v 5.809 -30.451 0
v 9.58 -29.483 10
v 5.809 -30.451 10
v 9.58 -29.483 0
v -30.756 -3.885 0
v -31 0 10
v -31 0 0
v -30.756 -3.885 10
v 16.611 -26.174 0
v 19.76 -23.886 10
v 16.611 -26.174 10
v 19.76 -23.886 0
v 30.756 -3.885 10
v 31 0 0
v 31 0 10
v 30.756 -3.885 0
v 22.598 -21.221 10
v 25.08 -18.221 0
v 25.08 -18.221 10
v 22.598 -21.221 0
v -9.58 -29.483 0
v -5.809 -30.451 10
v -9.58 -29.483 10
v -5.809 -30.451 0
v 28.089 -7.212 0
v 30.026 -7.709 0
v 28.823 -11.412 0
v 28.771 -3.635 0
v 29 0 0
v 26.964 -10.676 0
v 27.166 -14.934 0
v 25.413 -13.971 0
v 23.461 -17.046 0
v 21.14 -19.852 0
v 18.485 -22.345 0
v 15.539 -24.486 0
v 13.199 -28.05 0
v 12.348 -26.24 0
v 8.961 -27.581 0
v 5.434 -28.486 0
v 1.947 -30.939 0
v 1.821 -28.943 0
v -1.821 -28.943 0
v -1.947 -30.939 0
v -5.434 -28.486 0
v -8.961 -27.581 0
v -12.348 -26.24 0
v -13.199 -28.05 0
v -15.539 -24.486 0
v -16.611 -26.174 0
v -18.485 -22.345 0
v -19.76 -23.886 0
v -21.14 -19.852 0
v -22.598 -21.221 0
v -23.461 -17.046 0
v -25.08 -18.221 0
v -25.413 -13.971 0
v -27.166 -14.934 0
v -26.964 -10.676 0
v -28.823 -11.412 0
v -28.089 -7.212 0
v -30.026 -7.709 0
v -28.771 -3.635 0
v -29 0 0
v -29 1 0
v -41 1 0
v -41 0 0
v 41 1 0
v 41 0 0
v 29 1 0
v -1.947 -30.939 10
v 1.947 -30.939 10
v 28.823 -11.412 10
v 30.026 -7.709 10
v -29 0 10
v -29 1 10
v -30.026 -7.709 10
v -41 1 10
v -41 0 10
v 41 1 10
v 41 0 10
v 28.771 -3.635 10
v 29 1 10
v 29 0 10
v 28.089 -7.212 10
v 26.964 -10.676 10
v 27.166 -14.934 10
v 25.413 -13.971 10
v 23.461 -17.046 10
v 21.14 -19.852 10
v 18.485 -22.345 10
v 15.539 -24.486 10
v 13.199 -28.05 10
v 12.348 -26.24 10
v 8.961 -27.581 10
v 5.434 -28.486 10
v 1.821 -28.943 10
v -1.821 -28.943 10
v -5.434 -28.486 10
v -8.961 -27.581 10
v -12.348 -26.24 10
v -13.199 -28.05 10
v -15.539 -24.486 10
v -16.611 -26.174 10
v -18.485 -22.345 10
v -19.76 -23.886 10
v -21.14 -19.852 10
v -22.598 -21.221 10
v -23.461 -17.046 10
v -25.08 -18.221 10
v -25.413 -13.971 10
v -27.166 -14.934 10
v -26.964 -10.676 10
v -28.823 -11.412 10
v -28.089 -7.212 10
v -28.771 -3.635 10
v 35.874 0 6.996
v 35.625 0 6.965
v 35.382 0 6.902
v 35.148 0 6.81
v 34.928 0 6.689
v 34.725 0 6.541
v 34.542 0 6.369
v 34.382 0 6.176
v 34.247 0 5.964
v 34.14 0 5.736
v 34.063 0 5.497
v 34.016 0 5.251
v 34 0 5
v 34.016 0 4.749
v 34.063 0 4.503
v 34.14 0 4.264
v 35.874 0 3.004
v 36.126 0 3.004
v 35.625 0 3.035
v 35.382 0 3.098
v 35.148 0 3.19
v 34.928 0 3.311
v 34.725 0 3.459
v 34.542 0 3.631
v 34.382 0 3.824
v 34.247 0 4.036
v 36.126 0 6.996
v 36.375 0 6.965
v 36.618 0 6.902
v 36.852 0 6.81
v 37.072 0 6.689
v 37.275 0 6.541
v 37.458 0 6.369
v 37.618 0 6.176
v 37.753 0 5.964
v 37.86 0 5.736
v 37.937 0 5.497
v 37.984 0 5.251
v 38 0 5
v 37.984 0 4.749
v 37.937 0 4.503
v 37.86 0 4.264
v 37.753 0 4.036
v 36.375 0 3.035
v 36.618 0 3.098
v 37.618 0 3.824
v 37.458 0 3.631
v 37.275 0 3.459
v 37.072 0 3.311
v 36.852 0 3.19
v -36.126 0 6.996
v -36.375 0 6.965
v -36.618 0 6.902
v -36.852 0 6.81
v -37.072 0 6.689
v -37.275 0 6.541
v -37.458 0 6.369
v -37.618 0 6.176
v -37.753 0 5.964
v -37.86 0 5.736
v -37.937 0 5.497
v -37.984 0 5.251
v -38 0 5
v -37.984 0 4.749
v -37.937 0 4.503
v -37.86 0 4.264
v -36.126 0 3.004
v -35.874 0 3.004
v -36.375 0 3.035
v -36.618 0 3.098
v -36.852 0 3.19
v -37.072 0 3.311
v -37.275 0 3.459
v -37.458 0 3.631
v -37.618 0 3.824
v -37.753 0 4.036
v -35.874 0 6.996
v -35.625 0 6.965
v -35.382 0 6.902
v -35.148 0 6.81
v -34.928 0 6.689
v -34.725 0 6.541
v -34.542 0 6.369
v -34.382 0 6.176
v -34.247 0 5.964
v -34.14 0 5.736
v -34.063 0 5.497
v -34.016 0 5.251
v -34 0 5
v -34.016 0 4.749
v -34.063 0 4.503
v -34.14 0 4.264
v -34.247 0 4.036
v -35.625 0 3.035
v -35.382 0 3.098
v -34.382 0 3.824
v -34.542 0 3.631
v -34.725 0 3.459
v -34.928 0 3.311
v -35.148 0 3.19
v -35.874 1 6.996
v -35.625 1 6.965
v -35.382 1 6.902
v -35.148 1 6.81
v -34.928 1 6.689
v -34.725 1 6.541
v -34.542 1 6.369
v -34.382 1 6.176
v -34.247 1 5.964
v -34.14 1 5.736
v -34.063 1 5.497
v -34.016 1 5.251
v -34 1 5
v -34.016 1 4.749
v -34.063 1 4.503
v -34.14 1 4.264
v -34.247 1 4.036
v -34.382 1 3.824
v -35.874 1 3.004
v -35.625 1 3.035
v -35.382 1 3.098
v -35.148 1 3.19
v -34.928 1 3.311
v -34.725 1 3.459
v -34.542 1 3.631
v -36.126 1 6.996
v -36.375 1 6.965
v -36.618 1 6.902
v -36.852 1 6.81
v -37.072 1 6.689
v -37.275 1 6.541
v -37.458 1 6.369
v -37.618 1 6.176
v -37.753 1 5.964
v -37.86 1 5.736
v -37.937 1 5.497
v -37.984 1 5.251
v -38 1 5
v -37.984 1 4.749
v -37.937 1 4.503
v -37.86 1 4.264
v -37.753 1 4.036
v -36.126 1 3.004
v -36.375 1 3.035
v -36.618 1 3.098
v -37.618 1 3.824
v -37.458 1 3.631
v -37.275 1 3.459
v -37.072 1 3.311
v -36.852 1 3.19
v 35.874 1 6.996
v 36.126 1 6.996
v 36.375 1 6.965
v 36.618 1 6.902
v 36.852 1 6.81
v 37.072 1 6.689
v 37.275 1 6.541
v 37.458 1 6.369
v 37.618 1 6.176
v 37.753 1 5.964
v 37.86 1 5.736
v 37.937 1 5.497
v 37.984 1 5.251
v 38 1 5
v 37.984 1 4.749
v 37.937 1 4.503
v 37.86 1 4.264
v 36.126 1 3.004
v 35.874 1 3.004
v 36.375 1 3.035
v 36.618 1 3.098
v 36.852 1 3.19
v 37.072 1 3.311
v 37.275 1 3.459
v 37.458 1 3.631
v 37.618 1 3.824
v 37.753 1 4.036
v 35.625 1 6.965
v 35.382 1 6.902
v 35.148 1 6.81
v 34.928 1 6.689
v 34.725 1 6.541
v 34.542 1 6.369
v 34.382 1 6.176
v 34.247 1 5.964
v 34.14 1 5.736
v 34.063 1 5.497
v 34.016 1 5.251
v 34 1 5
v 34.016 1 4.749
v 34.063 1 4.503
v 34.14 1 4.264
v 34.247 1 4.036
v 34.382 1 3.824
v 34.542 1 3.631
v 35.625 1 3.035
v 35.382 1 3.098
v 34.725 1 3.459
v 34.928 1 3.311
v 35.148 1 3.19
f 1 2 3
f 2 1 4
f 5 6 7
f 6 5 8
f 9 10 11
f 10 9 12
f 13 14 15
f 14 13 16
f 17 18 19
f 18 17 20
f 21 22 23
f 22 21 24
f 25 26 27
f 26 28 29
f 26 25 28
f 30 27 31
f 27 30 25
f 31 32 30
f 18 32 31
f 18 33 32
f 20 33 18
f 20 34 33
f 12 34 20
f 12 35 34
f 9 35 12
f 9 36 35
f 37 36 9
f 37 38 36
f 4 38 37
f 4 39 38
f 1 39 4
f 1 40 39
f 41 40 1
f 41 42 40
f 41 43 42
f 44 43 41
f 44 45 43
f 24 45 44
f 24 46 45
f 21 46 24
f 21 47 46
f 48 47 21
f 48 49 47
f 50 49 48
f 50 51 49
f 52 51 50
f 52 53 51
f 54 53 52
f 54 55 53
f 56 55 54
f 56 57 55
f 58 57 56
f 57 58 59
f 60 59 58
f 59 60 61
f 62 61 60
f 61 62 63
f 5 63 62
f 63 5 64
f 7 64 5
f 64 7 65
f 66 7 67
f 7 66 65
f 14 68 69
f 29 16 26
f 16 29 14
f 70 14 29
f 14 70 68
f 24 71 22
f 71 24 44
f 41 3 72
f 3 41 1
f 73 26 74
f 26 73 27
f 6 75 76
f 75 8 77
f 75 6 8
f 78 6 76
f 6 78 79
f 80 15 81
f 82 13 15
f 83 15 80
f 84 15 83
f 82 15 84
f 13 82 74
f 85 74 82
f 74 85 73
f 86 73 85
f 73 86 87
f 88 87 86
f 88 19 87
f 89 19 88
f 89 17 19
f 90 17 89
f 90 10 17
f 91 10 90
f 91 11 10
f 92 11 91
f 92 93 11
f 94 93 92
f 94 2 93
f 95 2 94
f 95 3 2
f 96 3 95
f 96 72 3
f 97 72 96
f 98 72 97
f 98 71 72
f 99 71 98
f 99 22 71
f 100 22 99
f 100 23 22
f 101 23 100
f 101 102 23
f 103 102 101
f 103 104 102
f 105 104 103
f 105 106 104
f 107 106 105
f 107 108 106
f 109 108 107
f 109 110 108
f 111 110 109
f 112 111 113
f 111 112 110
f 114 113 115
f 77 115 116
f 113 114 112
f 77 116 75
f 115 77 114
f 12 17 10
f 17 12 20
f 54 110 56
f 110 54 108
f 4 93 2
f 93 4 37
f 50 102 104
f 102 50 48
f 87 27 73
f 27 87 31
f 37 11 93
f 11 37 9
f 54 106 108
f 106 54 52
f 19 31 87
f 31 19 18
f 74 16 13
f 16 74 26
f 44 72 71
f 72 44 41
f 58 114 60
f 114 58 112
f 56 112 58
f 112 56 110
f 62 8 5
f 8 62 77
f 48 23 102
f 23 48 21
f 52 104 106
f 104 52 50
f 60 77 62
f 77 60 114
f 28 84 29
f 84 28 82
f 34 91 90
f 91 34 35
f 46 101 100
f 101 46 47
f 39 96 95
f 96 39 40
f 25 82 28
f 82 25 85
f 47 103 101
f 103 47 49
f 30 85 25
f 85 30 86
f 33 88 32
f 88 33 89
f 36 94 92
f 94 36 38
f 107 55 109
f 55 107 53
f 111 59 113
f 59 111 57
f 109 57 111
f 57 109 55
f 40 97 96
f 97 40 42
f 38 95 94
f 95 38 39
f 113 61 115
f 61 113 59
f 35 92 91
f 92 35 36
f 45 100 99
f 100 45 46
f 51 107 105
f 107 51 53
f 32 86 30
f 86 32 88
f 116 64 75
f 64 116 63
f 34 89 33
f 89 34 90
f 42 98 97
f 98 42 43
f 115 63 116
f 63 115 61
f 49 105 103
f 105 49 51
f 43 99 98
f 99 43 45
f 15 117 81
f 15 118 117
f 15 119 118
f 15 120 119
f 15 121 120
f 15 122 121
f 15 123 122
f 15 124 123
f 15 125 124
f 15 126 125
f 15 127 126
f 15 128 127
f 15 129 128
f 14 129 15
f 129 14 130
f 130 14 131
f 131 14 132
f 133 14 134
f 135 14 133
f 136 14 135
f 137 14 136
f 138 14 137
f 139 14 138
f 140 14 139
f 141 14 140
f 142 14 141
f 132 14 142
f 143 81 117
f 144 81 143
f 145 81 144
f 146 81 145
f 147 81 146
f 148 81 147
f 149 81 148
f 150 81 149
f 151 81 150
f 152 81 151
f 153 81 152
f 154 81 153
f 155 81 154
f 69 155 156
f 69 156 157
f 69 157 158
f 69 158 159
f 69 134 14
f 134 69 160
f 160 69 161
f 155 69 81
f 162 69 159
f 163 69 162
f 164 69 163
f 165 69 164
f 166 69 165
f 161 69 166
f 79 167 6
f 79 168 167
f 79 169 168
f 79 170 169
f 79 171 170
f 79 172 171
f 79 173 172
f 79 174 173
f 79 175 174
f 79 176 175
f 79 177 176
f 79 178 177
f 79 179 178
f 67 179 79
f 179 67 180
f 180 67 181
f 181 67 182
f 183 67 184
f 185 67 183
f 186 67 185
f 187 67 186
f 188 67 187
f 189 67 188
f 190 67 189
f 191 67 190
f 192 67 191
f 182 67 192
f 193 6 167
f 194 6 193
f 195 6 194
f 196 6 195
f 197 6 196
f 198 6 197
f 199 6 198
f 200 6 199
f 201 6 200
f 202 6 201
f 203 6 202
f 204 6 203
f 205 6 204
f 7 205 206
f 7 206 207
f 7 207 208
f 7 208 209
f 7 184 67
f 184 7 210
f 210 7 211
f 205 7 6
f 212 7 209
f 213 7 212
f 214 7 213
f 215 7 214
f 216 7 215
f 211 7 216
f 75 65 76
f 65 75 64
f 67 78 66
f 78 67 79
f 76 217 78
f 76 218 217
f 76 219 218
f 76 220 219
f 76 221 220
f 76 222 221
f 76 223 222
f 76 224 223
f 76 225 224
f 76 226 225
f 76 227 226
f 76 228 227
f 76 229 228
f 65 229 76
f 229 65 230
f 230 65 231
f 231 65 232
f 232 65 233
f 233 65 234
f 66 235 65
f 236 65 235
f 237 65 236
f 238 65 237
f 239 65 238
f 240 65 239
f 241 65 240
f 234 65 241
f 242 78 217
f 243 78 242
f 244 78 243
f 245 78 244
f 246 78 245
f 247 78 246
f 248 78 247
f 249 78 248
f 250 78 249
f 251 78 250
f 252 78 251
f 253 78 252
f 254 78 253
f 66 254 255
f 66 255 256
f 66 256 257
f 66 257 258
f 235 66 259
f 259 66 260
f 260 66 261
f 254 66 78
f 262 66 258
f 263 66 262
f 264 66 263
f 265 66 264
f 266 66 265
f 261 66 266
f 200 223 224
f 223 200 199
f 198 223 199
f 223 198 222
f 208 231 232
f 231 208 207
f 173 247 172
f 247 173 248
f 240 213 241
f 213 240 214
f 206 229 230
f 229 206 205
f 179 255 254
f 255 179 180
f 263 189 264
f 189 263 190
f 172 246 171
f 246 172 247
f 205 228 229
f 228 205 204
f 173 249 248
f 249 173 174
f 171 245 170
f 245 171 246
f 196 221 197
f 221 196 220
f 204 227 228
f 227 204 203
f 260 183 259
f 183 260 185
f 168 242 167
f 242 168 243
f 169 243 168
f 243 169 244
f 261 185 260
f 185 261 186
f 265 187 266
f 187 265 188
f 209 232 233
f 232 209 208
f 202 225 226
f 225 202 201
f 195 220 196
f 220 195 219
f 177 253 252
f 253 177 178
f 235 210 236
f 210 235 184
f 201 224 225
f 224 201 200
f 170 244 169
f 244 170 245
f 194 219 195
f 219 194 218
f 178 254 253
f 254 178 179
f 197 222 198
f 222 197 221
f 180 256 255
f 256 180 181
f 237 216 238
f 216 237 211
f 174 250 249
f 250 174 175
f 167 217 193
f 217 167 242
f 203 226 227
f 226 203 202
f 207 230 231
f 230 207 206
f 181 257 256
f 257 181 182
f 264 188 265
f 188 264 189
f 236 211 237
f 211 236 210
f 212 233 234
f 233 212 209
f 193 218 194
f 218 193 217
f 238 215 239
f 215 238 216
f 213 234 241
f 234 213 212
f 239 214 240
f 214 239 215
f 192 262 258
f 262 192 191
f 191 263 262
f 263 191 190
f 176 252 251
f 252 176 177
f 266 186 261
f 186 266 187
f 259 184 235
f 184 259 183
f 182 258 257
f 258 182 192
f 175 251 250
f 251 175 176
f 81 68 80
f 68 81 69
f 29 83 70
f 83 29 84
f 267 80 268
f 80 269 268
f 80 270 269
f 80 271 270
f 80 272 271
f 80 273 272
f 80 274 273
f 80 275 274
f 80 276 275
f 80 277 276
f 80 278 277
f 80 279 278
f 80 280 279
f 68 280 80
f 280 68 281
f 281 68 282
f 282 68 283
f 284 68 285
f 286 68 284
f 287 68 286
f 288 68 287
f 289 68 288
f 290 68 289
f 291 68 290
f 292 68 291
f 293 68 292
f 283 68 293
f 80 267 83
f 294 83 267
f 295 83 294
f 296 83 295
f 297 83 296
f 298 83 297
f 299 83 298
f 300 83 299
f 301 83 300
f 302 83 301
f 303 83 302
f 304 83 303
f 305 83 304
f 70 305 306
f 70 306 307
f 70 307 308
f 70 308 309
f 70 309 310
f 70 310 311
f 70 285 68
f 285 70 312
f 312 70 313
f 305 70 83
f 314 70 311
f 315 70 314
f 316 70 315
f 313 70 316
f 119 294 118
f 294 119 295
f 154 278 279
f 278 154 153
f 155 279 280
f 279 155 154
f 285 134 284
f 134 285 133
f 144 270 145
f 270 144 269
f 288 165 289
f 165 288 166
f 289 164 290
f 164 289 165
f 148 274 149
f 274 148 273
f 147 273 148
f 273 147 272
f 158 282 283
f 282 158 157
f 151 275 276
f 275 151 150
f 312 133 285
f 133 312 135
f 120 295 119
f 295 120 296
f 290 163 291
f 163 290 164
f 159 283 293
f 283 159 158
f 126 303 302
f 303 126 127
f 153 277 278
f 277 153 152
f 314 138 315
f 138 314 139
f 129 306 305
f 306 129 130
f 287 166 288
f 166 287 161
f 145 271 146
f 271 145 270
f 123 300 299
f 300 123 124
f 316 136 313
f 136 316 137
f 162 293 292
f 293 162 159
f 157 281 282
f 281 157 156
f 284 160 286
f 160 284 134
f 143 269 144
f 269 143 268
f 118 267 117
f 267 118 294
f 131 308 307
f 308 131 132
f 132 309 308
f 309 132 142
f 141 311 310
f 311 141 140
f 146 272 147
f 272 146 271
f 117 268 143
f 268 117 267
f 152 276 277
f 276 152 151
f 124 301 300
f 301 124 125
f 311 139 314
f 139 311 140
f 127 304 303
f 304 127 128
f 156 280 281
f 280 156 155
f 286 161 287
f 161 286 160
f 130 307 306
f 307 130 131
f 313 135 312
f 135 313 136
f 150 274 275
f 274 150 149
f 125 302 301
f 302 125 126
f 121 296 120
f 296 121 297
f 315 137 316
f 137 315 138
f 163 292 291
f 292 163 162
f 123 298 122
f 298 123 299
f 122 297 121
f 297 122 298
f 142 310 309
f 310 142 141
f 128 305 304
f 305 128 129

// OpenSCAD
diameter = 58;
outerdiam = 4;
width = 2;
height = 10;
screw = 4;
screwHolder = 10 + width;

$fn = 50;
part = 0;

module screwSupport(right, supHeight, bigger) {
    difference() {     
        cube([screwHolder, supHeight, height]);

        translate([screwHolder / 2 + (right * width / 2), supHeight * 2, height / 2]) rotate([90, 0, 0]) cylinder(d = screw, h = supHeight * 4);

        if(bigger == 1) {
            translate([right * width * 2, 0, 0]) cube([screwHolder, supHeight - width, height]);
        }
    }
}

if(part == 0) {
    union() {
        difference() {
            cylinder(d = diameter + outerdiam, h = height);
            cylinder(d = diameter, h = height);

            translate([-diameter, 0, 0]) cube([diameter * 2, (diameter + width), height]);
        }

        translate([-(diameter / 2 + screwHolder), 0, 0]) screwSupport(-1, width / 2);
        translate([diameter / 2, 0, 0]) screwSupport(1, width / 2);
    }
}


holderHeight = diameter / 2 + 30;

if(part == 1) {
    union() {
        translate([-diameter / 2, 0, 0]) cube([diameter, width, height]);

        translate([-(diameter / 2 + screwHolder), 0, 0]) screwSupport(-1, holderHeight, 1);
        translate([diameter / 2, 0, 0]) screwSupport(1, holderHeight, 1);
    }
}
